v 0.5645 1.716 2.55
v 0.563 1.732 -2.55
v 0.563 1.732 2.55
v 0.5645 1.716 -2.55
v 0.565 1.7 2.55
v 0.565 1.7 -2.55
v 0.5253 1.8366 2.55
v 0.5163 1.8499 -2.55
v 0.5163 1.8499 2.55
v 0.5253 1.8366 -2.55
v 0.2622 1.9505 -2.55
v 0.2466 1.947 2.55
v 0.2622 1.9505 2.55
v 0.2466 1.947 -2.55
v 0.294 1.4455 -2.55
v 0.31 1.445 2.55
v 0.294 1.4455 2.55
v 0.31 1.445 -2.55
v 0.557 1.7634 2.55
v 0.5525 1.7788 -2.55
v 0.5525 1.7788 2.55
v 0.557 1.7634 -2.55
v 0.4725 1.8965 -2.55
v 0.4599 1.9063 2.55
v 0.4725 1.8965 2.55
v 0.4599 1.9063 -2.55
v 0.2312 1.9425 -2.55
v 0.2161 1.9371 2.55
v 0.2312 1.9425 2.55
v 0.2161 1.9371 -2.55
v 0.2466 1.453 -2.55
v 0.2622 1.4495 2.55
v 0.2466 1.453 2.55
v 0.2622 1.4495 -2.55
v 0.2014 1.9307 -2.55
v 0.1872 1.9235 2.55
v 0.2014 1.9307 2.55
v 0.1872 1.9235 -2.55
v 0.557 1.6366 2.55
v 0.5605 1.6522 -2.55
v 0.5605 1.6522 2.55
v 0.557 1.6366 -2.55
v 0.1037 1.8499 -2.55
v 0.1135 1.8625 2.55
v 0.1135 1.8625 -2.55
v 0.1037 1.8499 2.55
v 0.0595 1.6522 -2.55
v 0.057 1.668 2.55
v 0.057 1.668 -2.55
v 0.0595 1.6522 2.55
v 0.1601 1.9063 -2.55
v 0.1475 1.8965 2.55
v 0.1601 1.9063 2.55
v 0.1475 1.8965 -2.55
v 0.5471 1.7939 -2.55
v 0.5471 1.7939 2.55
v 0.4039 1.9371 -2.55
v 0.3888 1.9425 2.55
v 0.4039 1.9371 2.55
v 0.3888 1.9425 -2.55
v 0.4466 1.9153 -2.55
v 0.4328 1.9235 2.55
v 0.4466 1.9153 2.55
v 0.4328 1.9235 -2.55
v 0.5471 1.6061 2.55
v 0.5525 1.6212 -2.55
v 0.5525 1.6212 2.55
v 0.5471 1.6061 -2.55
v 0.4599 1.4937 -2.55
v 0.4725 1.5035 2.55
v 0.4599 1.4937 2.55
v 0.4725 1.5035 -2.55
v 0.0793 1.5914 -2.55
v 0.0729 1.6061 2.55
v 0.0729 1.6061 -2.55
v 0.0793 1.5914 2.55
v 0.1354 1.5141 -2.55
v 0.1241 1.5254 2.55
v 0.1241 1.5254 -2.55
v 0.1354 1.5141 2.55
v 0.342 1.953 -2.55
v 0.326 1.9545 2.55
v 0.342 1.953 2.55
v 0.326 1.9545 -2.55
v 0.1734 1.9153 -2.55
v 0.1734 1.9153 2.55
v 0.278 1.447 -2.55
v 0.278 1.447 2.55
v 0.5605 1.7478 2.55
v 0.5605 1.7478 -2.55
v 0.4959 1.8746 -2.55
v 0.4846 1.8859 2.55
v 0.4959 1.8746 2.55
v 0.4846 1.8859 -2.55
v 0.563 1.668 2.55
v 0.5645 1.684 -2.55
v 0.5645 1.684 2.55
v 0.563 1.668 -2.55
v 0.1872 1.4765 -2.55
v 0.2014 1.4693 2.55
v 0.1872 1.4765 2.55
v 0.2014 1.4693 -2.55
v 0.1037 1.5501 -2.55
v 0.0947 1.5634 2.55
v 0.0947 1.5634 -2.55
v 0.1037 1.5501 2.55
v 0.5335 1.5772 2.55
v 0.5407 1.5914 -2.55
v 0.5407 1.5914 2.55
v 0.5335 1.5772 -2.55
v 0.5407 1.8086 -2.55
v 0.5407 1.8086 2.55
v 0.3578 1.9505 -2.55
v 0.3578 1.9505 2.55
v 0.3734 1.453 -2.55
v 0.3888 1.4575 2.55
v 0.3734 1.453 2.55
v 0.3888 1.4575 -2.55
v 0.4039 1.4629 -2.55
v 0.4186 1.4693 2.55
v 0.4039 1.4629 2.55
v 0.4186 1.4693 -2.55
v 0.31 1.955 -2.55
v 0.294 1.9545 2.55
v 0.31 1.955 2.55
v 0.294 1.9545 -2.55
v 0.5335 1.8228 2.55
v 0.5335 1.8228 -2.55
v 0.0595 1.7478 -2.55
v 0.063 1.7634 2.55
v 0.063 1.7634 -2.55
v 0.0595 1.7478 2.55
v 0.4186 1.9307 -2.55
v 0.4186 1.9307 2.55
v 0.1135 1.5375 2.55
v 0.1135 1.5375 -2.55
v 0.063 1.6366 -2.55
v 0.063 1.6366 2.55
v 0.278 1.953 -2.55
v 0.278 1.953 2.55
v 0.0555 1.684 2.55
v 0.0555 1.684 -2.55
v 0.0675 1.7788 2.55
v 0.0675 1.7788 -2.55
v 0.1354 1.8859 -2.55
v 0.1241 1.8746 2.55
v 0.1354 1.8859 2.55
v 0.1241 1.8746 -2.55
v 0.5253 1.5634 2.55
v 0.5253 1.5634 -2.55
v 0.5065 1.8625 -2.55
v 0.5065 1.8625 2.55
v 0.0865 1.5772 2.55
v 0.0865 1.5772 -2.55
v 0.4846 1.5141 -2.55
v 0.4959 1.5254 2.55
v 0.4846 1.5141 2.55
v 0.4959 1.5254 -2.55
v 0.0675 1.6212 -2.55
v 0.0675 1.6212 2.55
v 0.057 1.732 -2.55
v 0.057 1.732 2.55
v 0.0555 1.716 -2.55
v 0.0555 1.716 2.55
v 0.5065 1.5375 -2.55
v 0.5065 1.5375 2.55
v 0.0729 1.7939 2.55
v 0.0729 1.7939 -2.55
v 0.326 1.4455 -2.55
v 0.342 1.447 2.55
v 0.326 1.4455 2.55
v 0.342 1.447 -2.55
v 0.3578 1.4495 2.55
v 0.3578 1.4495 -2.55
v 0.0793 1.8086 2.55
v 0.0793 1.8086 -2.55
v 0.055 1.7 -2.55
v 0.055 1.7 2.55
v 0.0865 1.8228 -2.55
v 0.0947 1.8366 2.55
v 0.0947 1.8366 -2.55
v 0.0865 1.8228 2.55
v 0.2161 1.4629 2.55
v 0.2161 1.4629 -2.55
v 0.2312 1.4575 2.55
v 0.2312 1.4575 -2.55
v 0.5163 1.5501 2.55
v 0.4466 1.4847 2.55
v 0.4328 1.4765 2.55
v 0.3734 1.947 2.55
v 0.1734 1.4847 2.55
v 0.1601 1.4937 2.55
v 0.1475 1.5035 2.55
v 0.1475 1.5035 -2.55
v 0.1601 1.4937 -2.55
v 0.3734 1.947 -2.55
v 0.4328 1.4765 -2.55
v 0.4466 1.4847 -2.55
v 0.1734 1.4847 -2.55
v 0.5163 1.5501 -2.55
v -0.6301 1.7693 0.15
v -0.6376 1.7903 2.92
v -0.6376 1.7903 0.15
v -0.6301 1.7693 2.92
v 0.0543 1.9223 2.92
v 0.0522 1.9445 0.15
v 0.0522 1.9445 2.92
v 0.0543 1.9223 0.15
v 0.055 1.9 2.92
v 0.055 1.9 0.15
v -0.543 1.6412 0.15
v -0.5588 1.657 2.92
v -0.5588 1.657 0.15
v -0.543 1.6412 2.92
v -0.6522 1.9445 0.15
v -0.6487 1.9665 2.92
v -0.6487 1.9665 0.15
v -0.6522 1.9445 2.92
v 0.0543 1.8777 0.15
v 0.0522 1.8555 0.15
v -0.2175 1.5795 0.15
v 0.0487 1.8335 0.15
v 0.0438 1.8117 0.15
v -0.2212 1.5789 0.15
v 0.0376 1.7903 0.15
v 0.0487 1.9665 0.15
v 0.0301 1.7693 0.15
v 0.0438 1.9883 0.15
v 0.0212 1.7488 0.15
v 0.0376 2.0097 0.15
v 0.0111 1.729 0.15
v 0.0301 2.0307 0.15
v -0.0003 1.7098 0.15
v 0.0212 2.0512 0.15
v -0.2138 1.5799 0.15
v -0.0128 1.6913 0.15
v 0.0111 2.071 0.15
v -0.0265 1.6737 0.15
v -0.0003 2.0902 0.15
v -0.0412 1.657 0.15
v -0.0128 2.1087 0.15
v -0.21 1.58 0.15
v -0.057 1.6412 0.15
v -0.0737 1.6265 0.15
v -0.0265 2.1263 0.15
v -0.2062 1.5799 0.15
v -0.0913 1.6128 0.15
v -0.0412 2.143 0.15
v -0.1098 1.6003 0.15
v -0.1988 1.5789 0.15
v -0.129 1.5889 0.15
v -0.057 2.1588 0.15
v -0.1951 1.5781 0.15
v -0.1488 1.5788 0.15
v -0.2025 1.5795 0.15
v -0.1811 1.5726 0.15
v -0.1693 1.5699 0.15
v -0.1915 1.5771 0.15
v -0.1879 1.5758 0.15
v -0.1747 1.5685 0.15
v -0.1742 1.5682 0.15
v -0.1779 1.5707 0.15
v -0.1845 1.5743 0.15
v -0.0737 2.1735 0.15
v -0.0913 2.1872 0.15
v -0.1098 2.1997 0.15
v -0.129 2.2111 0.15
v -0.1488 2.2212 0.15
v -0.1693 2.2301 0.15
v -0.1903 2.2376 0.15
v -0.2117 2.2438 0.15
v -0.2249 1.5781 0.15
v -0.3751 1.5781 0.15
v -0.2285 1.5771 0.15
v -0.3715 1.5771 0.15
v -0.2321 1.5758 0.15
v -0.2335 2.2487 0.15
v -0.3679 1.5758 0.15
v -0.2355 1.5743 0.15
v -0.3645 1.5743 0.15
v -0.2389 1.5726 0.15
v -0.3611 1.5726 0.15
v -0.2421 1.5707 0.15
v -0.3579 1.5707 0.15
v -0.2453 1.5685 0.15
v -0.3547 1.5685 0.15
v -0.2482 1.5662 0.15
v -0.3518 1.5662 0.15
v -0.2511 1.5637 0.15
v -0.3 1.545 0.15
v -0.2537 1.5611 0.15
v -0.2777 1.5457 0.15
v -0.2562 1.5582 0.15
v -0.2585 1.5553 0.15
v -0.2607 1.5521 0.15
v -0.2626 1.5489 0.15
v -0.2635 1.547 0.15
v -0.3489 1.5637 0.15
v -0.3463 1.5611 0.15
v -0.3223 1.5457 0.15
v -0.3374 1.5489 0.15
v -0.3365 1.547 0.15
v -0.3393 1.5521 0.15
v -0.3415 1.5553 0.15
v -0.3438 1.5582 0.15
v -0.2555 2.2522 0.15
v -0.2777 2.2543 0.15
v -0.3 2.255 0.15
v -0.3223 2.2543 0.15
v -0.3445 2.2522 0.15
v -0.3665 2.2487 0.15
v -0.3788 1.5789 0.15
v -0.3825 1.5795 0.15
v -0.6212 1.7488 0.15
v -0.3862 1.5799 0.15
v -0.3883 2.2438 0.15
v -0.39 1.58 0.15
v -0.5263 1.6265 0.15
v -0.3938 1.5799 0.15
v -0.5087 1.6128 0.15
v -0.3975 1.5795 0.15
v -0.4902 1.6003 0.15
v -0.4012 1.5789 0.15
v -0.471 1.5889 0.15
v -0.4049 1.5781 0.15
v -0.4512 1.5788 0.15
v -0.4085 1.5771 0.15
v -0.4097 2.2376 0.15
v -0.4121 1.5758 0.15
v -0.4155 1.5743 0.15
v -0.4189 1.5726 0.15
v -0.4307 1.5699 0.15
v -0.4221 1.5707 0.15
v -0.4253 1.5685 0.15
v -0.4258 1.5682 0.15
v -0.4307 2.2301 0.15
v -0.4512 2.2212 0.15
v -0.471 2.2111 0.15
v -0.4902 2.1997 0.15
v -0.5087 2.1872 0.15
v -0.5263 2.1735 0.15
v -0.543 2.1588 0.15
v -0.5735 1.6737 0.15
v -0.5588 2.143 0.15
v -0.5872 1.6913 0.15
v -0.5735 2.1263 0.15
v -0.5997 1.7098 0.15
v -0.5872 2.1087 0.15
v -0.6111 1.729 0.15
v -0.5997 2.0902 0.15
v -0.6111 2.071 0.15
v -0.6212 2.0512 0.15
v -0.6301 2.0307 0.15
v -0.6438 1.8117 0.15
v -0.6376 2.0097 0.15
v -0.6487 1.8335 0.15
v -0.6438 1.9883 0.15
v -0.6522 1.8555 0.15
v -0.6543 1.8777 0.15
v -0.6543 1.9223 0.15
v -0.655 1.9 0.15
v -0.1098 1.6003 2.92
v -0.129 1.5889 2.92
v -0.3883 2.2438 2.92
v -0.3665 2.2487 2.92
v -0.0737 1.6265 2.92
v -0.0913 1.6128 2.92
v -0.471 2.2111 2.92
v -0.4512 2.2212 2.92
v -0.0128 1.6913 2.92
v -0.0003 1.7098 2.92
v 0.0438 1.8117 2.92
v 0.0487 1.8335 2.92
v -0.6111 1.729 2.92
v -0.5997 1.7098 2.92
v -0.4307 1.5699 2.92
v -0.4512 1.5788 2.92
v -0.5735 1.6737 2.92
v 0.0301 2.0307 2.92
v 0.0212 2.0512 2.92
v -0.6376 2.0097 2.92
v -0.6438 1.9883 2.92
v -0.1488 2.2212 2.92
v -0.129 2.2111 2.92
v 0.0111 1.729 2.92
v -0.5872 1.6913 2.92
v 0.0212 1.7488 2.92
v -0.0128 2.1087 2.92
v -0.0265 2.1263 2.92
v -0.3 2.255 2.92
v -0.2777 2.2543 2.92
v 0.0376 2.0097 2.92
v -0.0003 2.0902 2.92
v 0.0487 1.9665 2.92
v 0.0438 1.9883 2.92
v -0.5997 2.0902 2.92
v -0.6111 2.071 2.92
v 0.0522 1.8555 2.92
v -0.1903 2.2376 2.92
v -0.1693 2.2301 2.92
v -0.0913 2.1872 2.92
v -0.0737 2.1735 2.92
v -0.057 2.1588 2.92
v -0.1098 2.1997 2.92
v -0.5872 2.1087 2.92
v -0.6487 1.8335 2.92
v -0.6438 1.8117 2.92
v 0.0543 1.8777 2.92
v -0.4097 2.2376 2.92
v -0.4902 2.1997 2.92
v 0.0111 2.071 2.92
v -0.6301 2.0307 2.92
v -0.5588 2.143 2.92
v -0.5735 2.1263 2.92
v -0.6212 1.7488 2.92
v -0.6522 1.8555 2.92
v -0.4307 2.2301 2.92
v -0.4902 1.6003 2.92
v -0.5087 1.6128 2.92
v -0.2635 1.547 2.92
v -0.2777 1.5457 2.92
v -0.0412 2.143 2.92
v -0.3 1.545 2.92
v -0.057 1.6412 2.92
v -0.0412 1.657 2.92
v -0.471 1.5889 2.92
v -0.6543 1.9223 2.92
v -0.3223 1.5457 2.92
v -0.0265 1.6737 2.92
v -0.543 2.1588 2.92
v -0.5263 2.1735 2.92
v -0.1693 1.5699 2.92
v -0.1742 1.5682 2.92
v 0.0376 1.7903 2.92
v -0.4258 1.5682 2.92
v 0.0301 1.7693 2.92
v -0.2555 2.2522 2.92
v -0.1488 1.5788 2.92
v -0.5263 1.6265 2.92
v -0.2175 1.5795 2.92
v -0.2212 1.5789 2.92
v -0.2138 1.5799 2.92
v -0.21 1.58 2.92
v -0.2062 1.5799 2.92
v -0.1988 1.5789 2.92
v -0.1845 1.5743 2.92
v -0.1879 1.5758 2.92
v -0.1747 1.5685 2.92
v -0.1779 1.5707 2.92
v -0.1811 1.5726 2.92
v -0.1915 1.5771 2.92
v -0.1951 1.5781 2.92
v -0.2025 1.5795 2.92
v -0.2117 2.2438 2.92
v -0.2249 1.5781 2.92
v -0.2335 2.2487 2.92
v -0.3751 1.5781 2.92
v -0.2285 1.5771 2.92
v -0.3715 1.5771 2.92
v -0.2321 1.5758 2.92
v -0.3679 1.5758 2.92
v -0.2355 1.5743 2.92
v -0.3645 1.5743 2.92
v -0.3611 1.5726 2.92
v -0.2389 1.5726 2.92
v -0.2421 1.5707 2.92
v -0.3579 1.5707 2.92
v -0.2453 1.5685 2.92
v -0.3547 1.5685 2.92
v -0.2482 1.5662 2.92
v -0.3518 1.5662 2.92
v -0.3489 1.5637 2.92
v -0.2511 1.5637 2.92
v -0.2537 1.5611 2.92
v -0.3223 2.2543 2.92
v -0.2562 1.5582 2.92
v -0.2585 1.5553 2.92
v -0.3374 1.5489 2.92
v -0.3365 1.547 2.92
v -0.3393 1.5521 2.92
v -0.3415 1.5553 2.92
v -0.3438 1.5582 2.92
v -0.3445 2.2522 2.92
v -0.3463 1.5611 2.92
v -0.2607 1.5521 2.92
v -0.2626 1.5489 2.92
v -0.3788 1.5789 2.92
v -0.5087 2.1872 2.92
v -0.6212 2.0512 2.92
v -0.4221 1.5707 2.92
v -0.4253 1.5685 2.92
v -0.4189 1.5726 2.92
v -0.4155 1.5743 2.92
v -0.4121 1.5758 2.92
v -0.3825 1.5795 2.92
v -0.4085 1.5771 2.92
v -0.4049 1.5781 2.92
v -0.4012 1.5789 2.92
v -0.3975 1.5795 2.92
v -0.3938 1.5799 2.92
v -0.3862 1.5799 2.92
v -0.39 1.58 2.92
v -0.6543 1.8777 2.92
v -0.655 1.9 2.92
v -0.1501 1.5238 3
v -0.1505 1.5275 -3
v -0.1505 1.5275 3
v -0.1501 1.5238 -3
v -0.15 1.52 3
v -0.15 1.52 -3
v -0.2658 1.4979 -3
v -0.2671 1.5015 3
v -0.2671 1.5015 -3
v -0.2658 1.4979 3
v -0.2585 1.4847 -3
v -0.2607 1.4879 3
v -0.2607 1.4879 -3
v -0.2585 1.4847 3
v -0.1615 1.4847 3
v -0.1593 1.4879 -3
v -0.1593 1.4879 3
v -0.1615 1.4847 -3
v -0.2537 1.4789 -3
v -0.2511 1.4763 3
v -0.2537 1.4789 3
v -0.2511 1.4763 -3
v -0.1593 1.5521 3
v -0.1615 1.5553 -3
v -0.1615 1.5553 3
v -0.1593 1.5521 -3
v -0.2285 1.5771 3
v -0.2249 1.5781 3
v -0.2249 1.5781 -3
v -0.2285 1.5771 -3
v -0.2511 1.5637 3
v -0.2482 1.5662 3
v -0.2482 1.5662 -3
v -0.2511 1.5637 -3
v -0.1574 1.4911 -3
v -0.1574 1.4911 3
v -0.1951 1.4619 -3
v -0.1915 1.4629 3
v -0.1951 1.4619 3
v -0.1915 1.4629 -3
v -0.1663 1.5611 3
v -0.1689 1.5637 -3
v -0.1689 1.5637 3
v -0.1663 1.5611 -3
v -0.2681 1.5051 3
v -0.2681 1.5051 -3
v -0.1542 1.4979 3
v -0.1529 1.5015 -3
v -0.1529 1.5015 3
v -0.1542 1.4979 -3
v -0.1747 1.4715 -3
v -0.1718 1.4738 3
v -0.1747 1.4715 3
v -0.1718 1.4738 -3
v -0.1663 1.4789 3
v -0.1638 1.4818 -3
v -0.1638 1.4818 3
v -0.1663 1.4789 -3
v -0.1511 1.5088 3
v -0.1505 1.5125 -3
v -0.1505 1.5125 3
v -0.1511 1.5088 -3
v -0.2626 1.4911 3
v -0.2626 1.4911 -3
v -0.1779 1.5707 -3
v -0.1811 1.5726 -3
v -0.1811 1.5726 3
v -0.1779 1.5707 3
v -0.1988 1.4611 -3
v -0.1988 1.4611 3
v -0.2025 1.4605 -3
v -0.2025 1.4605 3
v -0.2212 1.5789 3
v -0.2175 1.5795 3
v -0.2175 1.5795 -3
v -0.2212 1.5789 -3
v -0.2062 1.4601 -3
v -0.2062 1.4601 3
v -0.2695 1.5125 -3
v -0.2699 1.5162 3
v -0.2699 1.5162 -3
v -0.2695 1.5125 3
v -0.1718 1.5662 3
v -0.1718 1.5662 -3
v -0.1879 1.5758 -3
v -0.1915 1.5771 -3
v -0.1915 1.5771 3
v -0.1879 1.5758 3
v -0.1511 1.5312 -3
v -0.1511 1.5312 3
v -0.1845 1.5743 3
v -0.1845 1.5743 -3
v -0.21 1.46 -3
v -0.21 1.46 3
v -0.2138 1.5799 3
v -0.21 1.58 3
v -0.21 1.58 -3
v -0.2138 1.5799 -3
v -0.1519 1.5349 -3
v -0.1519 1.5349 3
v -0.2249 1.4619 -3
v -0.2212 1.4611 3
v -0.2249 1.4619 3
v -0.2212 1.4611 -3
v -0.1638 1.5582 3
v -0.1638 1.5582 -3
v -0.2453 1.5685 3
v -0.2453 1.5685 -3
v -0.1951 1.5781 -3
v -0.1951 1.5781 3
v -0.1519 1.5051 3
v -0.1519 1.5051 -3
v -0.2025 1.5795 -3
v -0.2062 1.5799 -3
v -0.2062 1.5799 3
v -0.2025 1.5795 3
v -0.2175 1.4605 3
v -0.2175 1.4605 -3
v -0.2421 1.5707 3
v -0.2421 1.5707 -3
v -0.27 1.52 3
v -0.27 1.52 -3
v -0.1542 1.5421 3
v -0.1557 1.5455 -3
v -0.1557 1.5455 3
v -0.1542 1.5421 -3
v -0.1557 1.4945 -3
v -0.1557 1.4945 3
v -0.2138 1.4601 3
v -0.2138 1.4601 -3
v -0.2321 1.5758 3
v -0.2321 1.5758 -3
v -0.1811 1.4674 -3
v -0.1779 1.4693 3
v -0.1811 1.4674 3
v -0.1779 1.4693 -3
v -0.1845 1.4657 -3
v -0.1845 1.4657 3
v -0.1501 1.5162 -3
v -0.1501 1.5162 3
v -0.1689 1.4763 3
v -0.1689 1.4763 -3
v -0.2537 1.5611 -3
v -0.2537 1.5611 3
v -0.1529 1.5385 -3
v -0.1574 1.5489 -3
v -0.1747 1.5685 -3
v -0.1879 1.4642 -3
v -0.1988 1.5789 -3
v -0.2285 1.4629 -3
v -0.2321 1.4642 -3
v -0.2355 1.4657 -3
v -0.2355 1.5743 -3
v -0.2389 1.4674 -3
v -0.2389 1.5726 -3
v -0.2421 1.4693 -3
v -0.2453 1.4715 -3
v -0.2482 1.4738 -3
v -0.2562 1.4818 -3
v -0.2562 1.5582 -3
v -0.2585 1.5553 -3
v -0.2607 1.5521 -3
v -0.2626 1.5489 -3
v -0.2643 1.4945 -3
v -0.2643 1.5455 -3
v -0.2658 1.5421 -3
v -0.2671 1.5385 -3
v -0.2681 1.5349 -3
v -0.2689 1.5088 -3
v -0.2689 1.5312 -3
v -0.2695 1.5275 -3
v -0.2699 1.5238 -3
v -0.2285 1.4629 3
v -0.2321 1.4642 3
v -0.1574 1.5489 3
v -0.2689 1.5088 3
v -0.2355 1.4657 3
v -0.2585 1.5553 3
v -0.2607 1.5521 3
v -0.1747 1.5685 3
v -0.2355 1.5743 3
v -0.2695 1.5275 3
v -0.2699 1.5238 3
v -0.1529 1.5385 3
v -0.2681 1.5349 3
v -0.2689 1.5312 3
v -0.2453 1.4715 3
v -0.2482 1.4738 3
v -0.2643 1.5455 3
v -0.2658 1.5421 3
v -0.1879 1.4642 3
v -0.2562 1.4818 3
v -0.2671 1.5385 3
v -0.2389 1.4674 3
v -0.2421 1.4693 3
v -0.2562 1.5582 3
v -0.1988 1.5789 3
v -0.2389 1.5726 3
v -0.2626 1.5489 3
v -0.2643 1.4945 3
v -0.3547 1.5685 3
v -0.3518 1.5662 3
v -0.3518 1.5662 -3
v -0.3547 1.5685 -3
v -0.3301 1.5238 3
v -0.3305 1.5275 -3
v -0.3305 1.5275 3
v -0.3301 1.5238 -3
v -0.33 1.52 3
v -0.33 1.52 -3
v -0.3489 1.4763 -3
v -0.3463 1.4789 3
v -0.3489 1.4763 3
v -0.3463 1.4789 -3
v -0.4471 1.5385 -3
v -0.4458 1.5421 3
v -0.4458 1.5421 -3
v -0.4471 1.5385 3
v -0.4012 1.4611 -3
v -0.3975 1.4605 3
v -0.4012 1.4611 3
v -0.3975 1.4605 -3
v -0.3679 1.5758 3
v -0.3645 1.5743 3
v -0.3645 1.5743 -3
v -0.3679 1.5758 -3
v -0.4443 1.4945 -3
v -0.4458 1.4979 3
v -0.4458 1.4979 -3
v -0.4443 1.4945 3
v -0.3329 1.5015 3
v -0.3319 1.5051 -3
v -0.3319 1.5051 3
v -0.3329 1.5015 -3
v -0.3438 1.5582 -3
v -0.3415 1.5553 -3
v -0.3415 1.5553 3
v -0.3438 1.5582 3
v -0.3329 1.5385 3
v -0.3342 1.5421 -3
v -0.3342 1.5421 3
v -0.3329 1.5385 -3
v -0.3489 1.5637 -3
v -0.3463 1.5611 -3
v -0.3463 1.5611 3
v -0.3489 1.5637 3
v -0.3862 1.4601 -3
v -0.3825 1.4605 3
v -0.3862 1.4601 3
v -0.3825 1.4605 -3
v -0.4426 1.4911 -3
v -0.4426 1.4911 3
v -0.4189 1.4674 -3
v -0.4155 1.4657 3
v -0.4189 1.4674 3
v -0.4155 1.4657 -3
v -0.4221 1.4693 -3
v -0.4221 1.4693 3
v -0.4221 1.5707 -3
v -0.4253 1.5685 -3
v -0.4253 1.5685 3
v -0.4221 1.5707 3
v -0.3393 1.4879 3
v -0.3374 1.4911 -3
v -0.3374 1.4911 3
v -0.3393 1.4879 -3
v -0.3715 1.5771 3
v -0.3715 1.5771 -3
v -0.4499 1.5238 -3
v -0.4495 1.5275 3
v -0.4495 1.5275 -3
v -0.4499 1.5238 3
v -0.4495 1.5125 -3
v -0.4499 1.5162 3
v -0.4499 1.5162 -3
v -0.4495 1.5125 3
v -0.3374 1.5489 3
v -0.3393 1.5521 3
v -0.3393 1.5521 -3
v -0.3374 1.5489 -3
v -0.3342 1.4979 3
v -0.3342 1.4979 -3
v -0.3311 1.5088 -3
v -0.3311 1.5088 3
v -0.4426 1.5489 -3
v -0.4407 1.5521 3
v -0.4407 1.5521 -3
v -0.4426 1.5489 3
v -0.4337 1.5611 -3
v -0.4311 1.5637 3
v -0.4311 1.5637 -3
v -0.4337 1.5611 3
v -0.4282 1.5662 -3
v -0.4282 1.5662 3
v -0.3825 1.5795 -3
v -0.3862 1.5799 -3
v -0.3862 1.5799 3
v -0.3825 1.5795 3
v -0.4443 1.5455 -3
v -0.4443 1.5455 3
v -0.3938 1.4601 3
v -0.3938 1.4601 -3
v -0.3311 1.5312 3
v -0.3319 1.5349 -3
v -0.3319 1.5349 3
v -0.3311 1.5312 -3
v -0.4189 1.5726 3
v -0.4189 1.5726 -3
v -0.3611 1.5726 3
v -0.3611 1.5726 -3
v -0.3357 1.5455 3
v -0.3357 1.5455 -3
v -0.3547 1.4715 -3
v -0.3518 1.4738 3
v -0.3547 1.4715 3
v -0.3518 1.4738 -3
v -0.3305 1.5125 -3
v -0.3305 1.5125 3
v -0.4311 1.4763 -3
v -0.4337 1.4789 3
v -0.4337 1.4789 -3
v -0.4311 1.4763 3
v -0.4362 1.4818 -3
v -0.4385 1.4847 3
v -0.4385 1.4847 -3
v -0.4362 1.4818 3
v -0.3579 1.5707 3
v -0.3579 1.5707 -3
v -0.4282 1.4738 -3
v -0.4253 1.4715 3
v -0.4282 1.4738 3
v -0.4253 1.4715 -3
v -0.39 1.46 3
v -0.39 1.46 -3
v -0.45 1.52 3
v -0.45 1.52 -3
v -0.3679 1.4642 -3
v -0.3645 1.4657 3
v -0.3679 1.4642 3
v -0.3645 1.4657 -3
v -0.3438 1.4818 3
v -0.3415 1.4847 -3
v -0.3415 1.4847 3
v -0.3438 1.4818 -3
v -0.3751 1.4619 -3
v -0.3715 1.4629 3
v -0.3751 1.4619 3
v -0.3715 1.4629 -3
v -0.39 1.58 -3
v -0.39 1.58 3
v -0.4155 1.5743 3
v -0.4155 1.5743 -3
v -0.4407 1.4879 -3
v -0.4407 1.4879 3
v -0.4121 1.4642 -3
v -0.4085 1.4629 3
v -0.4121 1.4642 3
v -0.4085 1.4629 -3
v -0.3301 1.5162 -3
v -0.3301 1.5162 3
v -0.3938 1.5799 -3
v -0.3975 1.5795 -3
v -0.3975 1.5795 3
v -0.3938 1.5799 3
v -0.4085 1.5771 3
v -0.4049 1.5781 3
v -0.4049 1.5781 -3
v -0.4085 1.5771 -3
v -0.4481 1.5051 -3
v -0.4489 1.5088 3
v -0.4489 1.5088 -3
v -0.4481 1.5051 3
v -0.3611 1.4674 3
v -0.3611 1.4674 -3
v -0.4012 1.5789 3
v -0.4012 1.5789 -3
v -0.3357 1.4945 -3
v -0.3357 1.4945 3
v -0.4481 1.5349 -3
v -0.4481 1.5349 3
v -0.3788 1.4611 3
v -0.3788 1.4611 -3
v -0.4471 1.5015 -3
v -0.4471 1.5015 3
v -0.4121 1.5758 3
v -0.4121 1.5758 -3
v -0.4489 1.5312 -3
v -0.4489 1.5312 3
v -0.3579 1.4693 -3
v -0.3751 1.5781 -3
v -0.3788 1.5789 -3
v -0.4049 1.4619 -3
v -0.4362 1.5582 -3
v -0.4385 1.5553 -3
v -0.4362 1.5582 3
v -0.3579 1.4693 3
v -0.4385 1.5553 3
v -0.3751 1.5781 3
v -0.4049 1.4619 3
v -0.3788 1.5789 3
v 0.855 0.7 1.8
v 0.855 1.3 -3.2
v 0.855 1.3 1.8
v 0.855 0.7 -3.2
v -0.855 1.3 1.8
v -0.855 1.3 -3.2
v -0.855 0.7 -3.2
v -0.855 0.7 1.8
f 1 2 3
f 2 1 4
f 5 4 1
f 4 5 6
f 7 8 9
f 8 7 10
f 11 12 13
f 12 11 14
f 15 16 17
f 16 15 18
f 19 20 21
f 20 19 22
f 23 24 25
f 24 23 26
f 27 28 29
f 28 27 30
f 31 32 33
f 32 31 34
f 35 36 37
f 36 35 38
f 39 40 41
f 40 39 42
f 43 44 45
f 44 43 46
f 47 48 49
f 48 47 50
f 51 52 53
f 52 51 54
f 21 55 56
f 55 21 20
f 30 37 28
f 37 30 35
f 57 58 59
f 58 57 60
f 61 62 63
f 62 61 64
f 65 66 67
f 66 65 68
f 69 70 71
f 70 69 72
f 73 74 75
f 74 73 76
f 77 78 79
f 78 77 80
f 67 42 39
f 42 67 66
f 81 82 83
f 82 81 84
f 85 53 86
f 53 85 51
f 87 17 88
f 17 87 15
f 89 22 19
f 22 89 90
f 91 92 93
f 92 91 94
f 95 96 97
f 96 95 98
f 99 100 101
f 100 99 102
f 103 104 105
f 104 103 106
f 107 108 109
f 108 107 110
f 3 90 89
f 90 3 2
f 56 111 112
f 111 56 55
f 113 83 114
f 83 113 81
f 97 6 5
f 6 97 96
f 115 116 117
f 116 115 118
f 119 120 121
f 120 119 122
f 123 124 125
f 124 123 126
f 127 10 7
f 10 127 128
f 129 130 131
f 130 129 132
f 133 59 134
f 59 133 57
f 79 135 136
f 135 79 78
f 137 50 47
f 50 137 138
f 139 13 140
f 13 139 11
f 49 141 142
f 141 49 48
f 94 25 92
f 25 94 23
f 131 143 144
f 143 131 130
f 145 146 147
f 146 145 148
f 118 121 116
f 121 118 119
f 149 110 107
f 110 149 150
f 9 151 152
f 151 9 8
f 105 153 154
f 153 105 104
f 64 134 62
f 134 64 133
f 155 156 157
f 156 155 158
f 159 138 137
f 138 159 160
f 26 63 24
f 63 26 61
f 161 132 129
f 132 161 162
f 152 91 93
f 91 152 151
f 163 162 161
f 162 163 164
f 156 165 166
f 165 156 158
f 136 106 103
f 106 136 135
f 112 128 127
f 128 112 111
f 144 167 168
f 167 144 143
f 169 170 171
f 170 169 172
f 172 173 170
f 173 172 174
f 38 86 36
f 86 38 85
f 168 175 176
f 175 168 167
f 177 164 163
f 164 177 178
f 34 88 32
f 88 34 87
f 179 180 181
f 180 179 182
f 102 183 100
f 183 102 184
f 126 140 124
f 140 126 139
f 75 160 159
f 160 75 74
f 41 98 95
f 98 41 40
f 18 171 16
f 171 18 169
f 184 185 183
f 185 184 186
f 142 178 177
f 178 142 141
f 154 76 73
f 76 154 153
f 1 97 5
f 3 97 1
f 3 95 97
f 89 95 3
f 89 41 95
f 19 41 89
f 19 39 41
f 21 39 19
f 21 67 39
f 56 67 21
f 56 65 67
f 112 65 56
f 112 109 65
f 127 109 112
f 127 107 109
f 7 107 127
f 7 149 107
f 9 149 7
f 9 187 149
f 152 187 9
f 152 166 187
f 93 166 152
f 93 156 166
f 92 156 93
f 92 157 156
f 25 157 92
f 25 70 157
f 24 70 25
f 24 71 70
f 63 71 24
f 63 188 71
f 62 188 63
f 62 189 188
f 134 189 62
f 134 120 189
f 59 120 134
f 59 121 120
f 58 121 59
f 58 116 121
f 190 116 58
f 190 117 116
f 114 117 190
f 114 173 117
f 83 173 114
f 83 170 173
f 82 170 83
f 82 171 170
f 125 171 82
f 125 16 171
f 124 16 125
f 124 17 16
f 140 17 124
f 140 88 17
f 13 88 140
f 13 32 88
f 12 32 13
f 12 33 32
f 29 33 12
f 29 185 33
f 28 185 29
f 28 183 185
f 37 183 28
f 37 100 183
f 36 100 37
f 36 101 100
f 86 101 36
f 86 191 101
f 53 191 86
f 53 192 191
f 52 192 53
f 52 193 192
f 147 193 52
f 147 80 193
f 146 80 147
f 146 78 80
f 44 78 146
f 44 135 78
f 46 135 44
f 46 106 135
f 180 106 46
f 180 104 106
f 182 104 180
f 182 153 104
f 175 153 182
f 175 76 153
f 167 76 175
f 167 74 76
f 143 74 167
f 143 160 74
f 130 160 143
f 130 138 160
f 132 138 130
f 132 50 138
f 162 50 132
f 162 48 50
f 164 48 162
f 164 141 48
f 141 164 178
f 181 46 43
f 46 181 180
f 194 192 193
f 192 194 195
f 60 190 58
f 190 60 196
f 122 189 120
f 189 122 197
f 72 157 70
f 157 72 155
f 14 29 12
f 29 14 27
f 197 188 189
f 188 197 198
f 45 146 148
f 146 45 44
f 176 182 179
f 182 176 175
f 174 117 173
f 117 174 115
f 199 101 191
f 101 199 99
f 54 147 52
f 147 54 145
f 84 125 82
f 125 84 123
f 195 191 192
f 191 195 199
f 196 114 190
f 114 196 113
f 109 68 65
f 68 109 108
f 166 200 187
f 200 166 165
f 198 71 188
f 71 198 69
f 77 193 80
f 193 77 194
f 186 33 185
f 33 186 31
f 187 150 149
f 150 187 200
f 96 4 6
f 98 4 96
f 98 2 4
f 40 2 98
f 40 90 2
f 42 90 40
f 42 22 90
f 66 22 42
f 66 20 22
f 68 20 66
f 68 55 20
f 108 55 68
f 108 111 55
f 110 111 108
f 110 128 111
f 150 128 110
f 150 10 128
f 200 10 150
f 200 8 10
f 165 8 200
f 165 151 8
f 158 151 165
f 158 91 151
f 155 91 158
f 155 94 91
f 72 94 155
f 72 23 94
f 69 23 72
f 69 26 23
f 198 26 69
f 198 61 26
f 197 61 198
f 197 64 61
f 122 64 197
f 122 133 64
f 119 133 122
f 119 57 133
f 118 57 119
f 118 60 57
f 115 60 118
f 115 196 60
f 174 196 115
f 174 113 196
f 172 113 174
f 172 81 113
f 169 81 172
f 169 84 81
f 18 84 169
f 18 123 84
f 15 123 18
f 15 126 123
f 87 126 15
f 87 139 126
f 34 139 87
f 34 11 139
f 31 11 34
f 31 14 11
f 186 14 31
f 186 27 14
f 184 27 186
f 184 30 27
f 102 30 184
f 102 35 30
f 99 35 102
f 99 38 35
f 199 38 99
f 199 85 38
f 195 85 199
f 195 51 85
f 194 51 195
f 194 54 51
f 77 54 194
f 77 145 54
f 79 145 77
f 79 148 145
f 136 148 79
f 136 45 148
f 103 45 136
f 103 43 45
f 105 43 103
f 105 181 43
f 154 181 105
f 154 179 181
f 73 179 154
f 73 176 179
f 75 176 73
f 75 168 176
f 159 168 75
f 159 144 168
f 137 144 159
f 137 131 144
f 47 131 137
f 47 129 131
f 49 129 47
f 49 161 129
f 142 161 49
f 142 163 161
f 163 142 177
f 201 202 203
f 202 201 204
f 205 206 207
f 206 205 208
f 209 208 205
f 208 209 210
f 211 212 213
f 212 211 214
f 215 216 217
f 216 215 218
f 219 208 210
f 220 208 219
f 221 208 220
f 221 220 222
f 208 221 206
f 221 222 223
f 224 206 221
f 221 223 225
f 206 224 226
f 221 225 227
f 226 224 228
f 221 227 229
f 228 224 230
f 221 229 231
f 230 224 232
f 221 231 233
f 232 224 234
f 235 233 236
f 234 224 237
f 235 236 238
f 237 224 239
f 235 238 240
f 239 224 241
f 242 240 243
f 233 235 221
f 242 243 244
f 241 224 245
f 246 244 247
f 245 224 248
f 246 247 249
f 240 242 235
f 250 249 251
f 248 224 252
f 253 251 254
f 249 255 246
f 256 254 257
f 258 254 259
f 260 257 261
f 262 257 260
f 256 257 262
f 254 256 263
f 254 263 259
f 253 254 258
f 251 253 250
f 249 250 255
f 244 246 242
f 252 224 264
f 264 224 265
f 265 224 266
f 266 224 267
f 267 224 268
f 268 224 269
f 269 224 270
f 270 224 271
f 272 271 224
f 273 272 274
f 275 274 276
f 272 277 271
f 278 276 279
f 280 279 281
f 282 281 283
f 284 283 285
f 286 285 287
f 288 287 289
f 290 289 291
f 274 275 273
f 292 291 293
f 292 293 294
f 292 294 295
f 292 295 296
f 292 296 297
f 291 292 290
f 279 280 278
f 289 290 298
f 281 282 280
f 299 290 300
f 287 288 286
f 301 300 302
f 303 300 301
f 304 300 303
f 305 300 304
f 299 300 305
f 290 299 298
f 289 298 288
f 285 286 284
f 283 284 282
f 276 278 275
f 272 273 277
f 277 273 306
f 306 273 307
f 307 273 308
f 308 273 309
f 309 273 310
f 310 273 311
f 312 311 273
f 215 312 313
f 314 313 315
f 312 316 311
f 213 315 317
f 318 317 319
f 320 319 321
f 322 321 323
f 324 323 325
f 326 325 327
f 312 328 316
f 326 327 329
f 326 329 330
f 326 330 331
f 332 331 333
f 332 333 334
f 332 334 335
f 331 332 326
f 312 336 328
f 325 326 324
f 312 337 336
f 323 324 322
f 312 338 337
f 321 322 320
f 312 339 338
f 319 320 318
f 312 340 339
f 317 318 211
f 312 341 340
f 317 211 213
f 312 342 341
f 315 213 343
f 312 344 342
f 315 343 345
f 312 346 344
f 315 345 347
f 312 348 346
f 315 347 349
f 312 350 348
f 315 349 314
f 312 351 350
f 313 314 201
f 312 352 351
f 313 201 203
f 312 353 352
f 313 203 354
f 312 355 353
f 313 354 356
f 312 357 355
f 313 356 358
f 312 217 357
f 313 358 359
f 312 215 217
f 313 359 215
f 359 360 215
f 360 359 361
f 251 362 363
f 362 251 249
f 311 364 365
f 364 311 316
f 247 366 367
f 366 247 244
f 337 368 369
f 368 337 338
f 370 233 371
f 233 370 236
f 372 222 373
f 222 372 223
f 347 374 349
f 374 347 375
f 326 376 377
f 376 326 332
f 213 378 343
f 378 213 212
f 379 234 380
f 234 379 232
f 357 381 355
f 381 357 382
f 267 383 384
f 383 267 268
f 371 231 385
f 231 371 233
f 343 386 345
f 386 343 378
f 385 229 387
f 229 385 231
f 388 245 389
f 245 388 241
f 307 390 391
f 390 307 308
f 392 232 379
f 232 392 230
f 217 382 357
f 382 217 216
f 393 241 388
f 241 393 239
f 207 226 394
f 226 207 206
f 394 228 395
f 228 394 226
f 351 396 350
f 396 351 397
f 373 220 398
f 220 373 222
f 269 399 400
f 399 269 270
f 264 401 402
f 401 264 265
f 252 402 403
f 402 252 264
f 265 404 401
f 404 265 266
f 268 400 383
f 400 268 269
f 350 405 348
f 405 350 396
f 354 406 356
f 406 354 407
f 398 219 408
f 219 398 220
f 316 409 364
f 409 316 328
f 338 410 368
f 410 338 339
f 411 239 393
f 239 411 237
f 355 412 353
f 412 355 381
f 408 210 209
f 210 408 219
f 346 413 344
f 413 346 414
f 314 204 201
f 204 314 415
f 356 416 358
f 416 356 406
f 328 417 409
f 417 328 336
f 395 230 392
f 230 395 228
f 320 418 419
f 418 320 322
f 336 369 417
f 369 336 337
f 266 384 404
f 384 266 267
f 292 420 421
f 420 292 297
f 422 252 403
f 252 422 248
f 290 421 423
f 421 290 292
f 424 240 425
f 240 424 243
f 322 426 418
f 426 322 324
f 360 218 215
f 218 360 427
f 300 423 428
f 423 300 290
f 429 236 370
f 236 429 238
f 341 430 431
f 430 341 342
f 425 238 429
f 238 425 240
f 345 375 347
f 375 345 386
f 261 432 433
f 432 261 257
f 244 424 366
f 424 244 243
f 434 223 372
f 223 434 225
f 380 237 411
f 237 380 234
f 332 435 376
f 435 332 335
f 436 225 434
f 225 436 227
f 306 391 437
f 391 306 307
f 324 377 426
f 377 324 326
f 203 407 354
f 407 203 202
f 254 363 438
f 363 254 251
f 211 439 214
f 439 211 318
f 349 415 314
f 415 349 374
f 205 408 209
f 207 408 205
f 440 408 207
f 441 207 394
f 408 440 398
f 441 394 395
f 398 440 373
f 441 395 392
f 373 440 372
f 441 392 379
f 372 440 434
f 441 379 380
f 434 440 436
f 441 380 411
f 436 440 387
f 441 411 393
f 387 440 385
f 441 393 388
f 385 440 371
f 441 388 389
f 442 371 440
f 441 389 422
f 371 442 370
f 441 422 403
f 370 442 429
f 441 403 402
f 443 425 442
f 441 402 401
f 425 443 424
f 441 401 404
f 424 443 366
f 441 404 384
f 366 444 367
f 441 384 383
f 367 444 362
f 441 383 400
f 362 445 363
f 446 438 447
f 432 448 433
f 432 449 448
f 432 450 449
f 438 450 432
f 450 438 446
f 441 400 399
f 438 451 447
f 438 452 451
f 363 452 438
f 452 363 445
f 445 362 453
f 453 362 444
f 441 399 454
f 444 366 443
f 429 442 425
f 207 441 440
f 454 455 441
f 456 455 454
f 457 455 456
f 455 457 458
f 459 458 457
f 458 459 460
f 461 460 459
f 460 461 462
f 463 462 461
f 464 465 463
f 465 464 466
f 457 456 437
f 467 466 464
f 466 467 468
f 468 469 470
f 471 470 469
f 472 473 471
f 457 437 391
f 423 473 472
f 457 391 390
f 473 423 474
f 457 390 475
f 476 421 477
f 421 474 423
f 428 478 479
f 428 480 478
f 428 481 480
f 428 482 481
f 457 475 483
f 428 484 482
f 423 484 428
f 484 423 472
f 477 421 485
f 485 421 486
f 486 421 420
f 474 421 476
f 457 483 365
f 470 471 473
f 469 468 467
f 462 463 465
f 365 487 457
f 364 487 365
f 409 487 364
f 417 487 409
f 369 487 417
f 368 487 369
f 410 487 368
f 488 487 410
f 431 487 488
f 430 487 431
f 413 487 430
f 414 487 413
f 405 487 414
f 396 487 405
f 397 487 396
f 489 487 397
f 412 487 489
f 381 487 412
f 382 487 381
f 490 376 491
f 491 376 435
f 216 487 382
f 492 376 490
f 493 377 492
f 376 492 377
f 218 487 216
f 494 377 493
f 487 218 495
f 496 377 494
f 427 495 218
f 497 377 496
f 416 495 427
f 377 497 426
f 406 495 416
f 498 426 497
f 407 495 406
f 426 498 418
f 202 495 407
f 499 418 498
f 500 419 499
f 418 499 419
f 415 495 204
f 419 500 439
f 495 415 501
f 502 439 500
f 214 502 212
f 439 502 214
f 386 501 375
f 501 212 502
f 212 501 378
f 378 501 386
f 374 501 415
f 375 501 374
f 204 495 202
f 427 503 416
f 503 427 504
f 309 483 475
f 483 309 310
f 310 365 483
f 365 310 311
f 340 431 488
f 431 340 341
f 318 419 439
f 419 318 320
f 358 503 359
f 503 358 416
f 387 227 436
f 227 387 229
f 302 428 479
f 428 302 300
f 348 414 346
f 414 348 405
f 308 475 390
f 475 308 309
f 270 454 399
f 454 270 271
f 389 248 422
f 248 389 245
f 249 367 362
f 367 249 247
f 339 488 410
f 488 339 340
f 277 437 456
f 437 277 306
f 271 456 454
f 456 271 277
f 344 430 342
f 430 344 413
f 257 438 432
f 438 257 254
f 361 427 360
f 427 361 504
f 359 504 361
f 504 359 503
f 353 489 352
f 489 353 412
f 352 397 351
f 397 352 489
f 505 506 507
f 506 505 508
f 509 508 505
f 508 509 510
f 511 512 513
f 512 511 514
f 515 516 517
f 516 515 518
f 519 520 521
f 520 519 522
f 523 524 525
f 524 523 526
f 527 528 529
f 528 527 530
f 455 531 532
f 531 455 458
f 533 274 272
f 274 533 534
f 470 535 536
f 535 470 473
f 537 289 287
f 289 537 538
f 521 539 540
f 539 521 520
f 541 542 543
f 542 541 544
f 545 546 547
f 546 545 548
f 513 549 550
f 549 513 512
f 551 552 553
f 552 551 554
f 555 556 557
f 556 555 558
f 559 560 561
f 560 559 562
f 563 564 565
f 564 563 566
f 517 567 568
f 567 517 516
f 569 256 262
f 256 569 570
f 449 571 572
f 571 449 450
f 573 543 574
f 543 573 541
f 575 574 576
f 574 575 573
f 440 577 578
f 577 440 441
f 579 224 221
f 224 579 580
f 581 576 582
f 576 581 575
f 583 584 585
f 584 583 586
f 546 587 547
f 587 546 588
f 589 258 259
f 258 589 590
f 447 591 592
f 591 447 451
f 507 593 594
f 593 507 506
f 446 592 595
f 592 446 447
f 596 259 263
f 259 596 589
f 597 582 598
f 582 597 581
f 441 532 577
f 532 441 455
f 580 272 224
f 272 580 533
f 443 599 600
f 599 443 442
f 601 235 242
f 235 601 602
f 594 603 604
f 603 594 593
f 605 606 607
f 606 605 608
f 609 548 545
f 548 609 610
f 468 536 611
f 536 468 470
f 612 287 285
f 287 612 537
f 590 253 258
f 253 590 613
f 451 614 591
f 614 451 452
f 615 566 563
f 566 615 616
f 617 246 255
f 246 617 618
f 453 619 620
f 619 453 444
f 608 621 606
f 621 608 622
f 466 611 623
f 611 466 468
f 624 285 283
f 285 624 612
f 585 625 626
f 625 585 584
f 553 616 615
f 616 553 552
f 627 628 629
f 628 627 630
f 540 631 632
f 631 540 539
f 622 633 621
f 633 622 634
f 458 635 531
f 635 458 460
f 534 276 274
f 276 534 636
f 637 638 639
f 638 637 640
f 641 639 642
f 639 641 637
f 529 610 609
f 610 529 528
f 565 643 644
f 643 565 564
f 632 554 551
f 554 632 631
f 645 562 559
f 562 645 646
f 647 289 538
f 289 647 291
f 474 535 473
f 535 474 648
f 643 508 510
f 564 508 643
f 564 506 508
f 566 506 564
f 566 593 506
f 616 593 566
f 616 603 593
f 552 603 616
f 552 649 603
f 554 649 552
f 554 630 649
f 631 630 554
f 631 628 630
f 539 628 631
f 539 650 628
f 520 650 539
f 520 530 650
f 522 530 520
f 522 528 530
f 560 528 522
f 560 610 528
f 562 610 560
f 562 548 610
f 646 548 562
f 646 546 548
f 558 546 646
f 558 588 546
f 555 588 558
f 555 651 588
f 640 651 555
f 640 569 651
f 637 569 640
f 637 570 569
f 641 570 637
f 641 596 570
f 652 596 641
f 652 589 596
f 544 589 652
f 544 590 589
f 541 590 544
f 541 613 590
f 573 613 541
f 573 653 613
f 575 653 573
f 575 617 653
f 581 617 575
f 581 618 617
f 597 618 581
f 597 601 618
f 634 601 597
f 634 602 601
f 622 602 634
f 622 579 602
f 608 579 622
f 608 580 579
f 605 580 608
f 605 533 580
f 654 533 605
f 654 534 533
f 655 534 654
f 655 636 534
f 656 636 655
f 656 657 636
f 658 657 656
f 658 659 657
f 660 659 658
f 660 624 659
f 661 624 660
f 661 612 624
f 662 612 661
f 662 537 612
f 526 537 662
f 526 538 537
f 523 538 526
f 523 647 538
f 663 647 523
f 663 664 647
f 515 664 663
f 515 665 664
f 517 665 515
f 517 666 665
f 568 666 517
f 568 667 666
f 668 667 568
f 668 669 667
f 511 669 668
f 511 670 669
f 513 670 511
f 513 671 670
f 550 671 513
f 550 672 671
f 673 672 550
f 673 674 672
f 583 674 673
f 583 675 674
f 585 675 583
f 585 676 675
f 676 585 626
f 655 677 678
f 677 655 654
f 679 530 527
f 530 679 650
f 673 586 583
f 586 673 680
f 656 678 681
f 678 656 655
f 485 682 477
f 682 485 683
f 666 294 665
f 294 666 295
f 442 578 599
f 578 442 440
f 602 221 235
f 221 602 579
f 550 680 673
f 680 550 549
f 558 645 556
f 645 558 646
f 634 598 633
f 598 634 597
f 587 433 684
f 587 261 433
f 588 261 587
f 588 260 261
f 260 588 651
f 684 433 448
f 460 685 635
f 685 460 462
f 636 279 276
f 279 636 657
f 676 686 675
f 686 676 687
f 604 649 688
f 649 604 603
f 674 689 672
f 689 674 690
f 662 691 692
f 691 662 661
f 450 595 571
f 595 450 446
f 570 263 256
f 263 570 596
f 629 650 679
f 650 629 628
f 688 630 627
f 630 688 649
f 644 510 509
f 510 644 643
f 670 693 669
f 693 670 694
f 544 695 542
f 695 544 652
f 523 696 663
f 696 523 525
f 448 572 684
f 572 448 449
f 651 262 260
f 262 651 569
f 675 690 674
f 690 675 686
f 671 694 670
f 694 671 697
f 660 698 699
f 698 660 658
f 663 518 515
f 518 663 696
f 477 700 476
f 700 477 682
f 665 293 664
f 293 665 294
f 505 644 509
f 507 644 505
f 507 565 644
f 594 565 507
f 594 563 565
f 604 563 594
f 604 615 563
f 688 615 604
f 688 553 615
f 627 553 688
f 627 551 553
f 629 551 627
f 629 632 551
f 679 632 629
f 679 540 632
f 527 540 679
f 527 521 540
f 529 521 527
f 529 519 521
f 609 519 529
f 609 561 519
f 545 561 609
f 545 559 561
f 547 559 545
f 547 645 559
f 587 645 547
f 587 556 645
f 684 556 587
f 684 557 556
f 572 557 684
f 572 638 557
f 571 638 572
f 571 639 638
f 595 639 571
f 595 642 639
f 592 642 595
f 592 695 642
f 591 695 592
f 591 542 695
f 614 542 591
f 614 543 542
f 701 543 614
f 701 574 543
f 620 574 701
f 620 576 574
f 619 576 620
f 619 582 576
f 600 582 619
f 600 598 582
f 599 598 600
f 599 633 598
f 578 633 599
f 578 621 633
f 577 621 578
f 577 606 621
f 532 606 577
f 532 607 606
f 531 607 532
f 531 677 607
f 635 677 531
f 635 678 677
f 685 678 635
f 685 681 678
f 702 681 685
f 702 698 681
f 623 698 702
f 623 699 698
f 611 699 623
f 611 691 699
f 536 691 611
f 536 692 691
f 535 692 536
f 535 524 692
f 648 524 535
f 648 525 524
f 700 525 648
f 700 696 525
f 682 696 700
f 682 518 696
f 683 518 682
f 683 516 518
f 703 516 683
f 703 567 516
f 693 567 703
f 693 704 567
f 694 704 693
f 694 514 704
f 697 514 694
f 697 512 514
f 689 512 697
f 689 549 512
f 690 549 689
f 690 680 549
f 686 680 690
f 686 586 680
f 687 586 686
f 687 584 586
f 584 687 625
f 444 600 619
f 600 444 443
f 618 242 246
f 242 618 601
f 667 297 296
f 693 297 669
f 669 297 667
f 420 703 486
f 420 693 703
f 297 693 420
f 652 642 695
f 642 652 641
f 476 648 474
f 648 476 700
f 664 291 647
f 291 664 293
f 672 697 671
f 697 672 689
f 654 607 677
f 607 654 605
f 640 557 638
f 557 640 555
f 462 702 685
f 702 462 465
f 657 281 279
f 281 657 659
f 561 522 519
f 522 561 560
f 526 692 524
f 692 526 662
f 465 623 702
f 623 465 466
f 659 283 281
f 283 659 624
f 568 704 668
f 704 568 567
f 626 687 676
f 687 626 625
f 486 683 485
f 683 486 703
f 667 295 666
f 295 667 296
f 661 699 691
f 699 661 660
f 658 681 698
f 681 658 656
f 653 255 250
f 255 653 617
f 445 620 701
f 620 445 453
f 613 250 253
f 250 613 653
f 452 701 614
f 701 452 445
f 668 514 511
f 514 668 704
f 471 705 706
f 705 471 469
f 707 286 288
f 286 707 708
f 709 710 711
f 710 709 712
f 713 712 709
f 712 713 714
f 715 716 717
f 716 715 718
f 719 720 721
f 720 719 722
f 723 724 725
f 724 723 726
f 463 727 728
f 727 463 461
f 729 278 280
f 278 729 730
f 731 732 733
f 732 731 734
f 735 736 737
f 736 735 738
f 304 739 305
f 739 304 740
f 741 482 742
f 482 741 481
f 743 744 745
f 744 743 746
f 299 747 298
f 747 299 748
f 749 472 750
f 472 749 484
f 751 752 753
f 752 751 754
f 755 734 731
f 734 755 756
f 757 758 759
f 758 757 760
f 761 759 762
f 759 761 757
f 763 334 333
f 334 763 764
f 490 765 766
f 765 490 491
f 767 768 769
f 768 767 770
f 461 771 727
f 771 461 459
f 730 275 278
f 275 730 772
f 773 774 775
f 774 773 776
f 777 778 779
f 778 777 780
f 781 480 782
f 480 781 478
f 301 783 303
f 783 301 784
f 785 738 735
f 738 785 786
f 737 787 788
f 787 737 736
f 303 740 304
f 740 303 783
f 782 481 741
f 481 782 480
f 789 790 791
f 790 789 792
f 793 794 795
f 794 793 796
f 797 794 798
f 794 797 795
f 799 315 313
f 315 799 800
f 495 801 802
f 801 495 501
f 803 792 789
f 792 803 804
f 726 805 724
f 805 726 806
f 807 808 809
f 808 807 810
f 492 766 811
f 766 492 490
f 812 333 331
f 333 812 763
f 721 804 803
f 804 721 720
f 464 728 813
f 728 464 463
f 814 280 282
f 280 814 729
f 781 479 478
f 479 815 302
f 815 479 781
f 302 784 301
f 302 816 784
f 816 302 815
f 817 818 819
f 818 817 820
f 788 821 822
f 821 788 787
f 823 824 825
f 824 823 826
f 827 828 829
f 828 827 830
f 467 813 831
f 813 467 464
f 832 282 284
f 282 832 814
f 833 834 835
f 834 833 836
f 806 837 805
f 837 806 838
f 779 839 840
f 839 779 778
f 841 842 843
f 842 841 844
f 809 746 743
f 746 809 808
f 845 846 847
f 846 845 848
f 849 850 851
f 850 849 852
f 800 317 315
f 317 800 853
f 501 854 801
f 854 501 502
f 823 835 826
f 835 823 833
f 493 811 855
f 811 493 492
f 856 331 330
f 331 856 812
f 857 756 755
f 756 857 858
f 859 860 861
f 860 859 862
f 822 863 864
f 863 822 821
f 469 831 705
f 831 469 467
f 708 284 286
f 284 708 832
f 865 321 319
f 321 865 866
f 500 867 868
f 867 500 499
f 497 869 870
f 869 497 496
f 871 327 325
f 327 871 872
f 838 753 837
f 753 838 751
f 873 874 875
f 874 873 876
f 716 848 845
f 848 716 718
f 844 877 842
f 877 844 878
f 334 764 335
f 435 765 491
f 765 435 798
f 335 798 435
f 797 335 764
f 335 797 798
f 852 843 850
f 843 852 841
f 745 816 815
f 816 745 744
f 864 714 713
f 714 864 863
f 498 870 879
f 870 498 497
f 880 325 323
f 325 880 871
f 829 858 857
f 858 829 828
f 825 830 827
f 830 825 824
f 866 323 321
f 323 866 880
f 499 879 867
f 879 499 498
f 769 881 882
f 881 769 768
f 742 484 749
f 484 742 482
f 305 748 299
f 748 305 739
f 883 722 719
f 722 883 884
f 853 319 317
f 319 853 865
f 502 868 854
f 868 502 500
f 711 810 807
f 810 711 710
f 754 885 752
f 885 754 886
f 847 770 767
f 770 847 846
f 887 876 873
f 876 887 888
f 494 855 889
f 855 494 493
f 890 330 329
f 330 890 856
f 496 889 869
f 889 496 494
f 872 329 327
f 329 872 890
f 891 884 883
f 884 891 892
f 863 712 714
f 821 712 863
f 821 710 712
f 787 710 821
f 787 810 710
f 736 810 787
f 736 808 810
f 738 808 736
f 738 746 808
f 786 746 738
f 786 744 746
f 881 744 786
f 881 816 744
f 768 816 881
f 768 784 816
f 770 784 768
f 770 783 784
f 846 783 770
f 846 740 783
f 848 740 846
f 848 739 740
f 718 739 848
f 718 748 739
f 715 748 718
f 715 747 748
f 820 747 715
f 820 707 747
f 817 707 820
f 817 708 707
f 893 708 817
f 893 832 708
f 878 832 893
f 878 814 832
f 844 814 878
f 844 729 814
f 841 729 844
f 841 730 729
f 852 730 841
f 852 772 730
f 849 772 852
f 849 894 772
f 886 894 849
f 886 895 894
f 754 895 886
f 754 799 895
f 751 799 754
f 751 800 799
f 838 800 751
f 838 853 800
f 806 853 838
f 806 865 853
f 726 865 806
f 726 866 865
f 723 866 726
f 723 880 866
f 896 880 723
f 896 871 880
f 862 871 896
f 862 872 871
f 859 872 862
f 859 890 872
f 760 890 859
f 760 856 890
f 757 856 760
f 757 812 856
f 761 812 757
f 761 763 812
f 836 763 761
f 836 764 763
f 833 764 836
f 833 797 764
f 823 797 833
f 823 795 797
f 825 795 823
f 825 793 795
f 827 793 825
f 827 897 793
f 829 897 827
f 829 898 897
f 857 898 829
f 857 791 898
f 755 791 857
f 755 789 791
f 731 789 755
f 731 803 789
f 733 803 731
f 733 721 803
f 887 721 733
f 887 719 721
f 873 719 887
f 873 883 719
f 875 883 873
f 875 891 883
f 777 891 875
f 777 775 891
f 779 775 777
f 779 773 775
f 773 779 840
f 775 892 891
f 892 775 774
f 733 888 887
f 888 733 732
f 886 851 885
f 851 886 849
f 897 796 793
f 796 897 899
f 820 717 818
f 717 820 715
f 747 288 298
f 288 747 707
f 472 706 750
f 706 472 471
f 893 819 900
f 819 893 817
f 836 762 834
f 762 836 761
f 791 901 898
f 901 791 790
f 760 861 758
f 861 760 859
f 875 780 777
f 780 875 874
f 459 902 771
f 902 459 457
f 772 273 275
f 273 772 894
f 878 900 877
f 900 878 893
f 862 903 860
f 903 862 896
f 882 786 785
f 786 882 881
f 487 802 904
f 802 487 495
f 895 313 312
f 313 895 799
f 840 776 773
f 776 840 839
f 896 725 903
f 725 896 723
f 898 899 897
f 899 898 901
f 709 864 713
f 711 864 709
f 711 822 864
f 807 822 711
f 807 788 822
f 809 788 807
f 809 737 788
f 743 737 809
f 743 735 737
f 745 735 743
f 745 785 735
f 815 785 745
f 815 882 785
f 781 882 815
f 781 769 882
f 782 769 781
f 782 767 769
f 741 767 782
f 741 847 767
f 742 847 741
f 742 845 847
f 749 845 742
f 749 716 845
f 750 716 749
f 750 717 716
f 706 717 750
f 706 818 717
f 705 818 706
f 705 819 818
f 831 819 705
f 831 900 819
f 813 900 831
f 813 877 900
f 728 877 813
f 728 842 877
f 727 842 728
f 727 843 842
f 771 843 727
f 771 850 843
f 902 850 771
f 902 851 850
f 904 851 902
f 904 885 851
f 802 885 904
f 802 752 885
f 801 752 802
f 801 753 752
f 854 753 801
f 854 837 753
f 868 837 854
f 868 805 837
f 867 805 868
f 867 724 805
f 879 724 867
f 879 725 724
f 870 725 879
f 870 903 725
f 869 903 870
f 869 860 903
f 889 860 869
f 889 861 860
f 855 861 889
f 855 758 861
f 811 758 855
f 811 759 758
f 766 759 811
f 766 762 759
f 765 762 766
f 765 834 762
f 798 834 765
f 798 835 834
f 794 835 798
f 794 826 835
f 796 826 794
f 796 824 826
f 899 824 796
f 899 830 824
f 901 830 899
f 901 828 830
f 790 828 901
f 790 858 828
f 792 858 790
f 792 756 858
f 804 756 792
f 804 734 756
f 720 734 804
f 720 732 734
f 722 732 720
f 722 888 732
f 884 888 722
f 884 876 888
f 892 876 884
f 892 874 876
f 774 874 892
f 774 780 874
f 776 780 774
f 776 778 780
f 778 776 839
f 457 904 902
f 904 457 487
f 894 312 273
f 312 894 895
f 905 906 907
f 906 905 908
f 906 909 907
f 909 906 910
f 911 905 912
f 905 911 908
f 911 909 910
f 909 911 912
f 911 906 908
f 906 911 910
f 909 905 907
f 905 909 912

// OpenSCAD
// (c) 2014, Stéphane Alnet

mm = 1;
cm = 10;
roundout = 0.05;

electronics_y = -18*mm;
electronics_length = 50*mm;
holes_length = 60*mm;
motor_x = -3.0;
motor_y = -1.5;
keep_centered = 0;
rod_length = 51*mm;


module contenu() {
  union()
  {
    // 5mm rod that holds the pieces together.
    translate([3.1,rod_length/2,17])
    rotate([90,0,0])
    cylinder(h = rod_length, r = (5/2+0.05)*mm, $fn=100);

    // motor.
    translate([motor_x,motor_y,1.9*cm])
    rotate([90,0,0])
    cylinder(h = 27.7*mm, r = (7/2+0.05)*mm, $fn=100);

    // Two transversal holes (diam=1.2mm) for the wires that connect to the motor.
    translate([motor_x+0.9,holes_length/2,15.2])
    rotate([90,0,0])
    cylinder(h = holes_length, r = 0.6*mm, $fn=100);
    translate([motor_x-0.9,holes_length/2,15.2])
    rotate([90,0,0])
    cylinder(h = holes_length, r = 0.6*mm, $fn=100);

    // electronics.
    translate([keep_centered,electronics_y+electronics_length/2,10*mm])
    scale([17.1,electronics_length,6])
    cube (size = 1, center = true);
  }
}

// Wings3D uses X-Z ground plane while OpenSCAD uses X-Y ground plane.
rotate([-90,0,0])
// Edit inside Wings3D using centimeters.
scale([0.1,0.1,0.1])
union() {
  // recenter, resize, then reposition
  // the bottom of the structure is the bottom of the electronics, which is at 10-6 = 4mm
  // the top is the top of the motor, which is at 1.9+7/2
  // this means we offset from origin is (4+1.9+7/2)/2 = 4.7mm
  translate([0,0,4.7*mm])
  // scale([1.2,1.2,1.2])
  translate([0,0,-4.7*mm])
  contenu();
}
